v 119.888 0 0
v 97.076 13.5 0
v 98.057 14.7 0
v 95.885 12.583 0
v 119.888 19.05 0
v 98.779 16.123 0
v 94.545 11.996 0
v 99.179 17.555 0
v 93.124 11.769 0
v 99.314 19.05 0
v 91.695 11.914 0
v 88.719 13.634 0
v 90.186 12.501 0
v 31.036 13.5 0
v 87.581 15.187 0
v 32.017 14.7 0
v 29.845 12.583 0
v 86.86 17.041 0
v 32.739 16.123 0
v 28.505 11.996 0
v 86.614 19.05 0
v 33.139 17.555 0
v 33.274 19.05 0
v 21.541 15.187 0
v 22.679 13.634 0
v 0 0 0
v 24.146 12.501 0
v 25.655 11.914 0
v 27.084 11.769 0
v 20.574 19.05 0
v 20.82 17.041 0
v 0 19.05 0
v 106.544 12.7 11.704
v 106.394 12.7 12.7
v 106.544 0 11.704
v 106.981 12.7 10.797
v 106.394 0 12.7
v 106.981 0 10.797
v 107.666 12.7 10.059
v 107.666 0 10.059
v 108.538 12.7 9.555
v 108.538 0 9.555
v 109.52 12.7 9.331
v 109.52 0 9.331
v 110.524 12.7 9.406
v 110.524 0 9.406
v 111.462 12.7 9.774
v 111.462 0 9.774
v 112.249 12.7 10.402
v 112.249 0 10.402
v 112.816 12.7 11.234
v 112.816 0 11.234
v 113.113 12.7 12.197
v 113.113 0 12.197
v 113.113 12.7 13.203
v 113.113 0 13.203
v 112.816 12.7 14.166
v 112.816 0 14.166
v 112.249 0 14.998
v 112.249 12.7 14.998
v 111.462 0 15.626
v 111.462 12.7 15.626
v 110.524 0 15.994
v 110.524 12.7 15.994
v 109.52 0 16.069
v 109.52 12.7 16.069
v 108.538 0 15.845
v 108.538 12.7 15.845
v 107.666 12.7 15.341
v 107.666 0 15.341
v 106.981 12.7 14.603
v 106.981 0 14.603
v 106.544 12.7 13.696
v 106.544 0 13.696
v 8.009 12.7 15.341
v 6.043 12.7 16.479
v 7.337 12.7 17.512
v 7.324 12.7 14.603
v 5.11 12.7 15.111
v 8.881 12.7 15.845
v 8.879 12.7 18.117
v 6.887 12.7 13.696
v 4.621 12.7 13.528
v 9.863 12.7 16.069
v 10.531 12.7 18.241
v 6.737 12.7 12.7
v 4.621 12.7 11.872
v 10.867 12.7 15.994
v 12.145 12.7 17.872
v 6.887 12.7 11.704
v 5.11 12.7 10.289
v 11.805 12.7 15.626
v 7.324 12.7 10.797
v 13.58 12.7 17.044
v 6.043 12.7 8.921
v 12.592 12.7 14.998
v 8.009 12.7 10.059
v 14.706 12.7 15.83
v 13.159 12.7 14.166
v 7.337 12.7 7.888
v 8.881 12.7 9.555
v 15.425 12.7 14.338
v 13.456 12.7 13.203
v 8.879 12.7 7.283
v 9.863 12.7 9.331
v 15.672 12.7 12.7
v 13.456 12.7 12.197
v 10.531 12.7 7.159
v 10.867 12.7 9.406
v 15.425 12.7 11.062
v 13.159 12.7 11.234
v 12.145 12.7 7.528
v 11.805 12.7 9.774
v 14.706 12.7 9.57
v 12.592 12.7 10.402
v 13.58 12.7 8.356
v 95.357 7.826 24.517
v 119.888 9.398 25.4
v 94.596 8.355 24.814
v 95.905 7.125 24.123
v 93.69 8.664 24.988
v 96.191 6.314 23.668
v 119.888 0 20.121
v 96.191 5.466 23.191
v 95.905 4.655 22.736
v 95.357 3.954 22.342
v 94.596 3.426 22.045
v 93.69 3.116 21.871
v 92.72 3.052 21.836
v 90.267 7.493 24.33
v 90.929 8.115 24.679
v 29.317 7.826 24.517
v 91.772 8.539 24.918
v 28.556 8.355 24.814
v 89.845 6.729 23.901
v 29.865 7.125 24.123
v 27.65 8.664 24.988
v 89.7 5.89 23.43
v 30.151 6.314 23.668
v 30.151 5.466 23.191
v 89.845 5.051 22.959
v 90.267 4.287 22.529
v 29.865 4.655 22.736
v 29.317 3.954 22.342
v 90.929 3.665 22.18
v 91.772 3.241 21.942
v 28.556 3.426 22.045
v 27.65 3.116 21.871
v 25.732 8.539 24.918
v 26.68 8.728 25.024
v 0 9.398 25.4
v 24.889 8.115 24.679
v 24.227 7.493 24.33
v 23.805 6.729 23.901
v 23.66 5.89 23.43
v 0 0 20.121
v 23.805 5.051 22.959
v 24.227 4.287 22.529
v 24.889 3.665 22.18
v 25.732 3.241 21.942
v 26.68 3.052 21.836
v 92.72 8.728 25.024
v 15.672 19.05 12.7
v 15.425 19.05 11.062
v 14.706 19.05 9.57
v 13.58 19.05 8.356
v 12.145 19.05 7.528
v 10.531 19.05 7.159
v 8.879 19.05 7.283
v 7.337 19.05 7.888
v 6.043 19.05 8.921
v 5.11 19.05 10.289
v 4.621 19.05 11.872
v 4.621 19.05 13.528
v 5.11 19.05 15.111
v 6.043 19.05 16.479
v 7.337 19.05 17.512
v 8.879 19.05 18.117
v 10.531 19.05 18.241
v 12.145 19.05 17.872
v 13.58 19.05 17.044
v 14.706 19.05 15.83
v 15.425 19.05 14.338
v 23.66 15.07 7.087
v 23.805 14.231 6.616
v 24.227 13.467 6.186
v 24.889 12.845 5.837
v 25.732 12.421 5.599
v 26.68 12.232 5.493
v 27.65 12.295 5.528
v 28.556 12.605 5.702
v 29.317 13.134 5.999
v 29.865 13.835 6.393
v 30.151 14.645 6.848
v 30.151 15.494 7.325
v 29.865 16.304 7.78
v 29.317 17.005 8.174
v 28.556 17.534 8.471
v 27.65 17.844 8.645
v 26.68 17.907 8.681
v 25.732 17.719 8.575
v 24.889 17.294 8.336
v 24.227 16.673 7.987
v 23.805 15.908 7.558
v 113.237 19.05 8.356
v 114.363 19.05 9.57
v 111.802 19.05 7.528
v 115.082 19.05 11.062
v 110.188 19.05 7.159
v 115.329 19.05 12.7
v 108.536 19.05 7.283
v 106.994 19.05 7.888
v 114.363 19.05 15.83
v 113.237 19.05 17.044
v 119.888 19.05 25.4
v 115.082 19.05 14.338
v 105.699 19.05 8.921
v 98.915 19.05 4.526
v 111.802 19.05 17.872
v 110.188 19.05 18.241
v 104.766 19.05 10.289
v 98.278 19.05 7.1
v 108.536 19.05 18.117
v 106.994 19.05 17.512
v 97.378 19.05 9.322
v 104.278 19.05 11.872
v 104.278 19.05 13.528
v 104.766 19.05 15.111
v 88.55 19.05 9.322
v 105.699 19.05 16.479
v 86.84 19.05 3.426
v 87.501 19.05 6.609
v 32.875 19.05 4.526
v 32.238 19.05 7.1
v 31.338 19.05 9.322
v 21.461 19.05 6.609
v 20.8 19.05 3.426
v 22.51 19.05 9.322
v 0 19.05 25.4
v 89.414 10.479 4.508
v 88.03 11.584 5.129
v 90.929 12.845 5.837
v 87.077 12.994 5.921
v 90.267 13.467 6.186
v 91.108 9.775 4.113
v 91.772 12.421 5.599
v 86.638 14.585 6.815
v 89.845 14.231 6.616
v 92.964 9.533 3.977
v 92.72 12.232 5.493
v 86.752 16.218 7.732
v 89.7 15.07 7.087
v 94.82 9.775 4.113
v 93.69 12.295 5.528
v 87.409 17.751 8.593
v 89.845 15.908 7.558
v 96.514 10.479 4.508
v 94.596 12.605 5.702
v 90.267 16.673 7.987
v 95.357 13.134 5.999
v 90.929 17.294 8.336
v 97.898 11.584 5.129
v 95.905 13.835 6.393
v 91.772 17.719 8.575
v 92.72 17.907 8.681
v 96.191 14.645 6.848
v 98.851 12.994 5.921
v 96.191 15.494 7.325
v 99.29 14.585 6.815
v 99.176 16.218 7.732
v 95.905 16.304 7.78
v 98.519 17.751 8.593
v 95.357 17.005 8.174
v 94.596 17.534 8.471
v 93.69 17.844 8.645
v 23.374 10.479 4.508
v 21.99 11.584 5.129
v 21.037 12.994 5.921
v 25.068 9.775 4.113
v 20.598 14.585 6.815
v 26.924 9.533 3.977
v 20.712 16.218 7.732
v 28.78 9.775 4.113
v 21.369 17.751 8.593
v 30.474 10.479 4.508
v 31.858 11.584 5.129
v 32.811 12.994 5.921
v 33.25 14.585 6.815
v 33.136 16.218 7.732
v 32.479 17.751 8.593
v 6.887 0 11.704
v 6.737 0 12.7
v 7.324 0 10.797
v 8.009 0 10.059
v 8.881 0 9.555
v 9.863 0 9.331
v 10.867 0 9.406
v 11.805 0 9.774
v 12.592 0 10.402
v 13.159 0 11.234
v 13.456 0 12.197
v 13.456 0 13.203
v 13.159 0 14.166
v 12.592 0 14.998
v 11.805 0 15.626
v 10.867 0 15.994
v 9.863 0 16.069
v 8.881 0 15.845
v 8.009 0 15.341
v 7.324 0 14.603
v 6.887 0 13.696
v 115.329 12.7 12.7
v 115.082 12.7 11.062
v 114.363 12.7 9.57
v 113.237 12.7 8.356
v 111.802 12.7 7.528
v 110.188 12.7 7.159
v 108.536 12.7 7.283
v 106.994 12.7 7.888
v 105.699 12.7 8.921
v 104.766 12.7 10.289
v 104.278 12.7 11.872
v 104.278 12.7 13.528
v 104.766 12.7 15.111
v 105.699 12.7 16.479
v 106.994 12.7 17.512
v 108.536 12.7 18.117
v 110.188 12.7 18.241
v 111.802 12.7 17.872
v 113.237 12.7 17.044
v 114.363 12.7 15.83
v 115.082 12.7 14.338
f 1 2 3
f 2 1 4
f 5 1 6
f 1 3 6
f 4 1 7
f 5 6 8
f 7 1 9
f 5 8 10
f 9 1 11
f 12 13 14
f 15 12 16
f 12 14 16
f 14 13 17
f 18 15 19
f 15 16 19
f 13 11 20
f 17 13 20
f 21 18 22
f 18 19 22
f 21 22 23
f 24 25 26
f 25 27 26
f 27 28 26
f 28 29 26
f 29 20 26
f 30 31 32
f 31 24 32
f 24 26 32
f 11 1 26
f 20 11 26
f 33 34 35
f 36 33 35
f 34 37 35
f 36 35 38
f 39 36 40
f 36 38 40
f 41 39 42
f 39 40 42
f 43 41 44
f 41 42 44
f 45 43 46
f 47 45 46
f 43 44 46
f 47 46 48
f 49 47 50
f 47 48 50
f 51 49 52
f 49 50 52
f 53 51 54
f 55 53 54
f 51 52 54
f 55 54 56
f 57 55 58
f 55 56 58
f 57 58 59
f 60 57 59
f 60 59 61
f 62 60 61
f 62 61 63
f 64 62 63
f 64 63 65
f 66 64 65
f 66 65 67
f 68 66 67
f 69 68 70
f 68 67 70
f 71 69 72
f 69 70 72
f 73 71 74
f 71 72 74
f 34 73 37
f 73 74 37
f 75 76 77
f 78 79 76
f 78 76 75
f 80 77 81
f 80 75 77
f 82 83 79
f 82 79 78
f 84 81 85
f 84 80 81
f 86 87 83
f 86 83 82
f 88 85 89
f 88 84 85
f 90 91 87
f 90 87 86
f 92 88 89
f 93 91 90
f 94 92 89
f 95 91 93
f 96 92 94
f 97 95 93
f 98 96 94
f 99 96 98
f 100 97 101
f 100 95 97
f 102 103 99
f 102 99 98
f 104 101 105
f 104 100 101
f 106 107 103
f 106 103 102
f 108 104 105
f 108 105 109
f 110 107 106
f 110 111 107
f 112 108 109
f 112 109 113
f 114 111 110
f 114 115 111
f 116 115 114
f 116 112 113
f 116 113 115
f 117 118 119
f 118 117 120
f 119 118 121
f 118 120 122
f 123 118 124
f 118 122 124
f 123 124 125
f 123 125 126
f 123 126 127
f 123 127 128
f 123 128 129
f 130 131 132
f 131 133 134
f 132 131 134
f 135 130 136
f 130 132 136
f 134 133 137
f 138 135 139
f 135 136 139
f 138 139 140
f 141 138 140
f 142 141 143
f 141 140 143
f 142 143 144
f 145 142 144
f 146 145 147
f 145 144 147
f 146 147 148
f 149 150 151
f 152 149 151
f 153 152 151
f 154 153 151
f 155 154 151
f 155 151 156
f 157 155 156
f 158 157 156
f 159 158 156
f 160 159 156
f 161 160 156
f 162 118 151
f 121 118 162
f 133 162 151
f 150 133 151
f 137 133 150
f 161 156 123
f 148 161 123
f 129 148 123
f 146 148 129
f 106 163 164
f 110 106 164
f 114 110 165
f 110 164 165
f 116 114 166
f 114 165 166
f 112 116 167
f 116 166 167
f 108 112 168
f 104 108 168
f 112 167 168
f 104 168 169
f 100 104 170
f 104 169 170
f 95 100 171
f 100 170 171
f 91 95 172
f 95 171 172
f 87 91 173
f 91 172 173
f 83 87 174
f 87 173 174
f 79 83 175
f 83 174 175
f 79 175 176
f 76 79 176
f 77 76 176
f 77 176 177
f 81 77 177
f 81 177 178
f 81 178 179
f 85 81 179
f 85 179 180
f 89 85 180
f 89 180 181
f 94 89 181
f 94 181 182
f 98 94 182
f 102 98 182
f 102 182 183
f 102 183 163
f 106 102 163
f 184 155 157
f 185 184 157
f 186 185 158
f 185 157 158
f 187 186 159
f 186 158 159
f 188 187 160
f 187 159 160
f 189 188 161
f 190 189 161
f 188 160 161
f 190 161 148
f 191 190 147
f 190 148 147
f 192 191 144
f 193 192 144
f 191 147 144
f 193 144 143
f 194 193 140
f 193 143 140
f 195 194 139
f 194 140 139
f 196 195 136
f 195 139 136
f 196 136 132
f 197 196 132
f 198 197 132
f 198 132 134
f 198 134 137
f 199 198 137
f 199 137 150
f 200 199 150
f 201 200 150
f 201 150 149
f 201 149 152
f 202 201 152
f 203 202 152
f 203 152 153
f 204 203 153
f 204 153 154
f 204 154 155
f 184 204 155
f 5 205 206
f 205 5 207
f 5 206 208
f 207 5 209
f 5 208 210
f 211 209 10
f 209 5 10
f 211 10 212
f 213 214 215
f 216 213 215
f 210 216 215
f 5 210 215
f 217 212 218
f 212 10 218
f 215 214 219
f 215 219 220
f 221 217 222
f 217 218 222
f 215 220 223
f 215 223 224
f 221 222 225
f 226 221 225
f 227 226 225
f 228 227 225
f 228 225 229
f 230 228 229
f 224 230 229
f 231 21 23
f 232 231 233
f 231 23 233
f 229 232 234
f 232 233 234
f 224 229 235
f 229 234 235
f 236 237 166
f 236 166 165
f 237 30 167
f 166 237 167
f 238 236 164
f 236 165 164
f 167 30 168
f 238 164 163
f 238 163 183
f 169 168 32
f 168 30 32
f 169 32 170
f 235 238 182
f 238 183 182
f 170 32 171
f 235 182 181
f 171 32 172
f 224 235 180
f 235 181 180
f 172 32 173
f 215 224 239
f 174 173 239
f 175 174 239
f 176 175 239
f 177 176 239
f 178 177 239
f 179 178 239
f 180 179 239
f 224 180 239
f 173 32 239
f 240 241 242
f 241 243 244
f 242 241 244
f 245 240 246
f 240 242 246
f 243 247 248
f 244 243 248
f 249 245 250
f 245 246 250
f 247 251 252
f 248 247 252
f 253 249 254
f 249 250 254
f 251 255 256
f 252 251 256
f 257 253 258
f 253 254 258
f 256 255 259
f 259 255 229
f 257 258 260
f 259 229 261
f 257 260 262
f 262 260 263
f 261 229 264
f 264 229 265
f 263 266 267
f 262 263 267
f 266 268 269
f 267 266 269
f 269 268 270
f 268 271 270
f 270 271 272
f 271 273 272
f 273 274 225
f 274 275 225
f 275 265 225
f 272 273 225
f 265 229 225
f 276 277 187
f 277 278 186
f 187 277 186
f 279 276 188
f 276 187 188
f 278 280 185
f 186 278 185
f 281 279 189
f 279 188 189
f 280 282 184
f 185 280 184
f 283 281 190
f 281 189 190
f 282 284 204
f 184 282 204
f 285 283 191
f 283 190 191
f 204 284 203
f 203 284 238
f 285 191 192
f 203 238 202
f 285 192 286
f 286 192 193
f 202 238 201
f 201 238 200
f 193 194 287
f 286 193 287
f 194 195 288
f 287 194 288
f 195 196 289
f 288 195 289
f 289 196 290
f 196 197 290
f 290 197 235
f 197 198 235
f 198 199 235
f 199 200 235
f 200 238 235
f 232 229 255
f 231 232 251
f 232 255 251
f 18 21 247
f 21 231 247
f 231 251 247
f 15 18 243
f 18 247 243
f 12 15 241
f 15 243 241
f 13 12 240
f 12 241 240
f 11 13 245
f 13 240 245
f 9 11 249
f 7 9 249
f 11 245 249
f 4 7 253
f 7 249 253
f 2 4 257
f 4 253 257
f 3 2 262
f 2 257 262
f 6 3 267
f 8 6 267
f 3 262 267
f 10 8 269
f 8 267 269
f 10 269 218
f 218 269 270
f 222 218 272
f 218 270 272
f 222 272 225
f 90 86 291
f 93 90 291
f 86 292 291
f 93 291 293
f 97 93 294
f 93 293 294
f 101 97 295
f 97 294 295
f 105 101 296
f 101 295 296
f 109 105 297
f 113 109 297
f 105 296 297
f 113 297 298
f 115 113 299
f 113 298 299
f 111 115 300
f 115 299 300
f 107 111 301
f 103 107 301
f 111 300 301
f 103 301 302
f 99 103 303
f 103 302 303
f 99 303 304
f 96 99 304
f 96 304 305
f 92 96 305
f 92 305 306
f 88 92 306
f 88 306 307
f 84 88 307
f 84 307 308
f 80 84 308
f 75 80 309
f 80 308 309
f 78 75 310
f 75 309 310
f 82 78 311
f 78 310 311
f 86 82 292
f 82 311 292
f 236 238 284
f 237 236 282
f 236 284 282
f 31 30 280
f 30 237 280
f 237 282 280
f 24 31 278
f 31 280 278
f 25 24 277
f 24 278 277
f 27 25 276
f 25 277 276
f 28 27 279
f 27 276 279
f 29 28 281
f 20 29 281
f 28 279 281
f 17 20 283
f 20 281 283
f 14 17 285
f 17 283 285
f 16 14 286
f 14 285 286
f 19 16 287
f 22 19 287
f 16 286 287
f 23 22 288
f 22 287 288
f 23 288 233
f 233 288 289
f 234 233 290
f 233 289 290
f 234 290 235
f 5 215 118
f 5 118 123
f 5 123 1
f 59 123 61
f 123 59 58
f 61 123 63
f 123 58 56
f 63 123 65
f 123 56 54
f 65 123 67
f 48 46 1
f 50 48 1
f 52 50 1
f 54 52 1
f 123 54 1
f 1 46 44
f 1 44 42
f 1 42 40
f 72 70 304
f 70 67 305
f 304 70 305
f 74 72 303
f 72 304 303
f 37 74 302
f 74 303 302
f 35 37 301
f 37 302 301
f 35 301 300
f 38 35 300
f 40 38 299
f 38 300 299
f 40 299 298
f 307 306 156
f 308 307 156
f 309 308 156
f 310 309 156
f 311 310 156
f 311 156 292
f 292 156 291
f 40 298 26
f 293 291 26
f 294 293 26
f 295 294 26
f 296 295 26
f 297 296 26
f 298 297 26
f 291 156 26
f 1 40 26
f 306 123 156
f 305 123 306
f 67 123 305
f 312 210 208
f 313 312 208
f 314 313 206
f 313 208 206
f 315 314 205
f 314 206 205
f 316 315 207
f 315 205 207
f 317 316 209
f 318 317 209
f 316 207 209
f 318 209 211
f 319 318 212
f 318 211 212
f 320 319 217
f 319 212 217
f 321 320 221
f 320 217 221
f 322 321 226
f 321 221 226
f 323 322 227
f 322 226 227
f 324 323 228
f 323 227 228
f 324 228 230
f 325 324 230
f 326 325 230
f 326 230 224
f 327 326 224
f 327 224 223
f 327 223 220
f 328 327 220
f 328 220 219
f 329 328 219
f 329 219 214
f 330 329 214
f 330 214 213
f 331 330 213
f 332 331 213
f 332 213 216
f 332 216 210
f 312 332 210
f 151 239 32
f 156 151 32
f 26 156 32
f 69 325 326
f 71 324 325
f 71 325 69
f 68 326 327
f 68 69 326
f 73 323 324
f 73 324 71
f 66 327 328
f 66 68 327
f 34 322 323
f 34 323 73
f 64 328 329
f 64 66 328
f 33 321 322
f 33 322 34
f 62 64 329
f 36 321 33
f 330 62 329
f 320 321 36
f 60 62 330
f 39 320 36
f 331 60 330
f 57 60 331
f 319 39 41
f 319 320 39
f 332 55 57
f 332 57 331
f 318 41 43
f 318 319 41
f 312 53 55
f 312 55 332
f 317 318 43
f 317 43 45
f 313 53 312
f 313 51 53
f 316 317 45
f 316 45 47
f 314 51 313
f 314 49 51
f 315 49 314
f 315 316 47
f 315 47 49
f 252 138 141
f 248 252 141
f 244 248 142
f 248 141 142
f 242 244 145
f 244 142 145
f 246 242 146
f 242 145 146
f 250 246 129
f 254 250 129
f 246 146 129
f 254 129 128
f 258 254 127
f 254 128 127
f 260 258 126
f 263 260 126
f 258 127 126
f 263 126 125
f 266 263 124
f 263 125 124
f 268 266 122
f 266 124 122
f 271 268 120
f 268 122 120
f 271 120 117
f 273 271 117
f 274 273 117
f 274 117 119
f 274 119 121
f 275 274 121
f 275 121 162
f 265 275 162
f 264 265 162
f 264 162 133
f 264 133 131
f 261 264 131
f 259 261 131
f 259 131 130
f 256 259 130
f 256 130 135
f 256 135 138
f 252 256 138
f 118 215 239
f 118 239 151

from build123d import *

# Parameters (mm, degrees)
BOSS_EXTRUDE1_DEPTH                              = 119.888
CBORE_FOR_1_4_SOCKET_HEAD_CAP_SCREW1_D           = 6.7564
CBORE_FOR_1_4_SOCKET_HEAD_CAP_SCREW1_CBORE_D     = 11.1125
CBORE_FOR_1_4_SOCKET_HEAD_CAP_SCREW1_CBORE_DEPTH = 6.35
F_5_16_18_TAPPED_HOLE1_D                         = 6.5278
SKETCH6_R                                        = 6.35
CUT_EXTRUDE1_DEPTH                               = 125.150820709


with BuildPart() as part:
    # Sketch1 → Boss-Extrude1 (new body)
    with BuildSketch(Plane(origin=(0, 0, 0), x_dir=(0, 0, -1), z_dir=(1, 0, 0))):
        Polygon((0, 0), (0, 19.05), (-25.4, 19.05), (-25.4, 9.398), (-20.121342373, 0), align=None)
    extrude(amount=BOSS_EXTRUDE1_DEPTH)

    # CBORE for 1/4 Socket Head Cap Screw1 (through all)
    with Locations(Plane(origin=(0, 19.05, 0), x_dir=(1, 0, 0), z_dir=(0, 1, 0))):
        with Locations((10.11555, -12.7), (109.77245, -12.7)):
            CounterBoreHole(CBORE_FOR_1_4_SOCKET_HEAD_CAP_SCREW1_D / 2, CBORE_FOR_1_4_SOCKET_HEAD_CAP_SCREW1_CBORE_D / 2, CBORE_FOR_1_4_SOCKET_HEAD_CAP_SCREW1_CBORE_DEPTH)

    # 5/16-18 Tapped Hole1 (through all)
    with Locations(Plane(origin=(0, 4.568628166, -8.133879962), x_dir=(1, 0, 0), z_dir=(0, 0.48971726622701756, -0.8718812987781861))):
        with Locations((92.964, -16.609338742), (26.924, -16.609338742)):
            Hole(F_5_16_18_TAPPED_HOLE1_D / 2)

    # Sketch6 → Cut-Extrude1 (cut, through all)
    with BuildSketch(Plane(origin=(0, 0.588206226, -1.047228766), x_dir=(1, 0, 0), z_dir=(0, -0.48971726622701756, 0.8718812987781861))):
        with Locations((26.924, 16.609338742)):
            Circle(SKETCH6_R)
        with Locations((92.964, 16.609338742)):
            Circle(SKETCH6_R)
    extrude(amount=-CUT_EXTRUDE1_DEPTH, mode=Mode.SUBTRACT)


solid = part.part
